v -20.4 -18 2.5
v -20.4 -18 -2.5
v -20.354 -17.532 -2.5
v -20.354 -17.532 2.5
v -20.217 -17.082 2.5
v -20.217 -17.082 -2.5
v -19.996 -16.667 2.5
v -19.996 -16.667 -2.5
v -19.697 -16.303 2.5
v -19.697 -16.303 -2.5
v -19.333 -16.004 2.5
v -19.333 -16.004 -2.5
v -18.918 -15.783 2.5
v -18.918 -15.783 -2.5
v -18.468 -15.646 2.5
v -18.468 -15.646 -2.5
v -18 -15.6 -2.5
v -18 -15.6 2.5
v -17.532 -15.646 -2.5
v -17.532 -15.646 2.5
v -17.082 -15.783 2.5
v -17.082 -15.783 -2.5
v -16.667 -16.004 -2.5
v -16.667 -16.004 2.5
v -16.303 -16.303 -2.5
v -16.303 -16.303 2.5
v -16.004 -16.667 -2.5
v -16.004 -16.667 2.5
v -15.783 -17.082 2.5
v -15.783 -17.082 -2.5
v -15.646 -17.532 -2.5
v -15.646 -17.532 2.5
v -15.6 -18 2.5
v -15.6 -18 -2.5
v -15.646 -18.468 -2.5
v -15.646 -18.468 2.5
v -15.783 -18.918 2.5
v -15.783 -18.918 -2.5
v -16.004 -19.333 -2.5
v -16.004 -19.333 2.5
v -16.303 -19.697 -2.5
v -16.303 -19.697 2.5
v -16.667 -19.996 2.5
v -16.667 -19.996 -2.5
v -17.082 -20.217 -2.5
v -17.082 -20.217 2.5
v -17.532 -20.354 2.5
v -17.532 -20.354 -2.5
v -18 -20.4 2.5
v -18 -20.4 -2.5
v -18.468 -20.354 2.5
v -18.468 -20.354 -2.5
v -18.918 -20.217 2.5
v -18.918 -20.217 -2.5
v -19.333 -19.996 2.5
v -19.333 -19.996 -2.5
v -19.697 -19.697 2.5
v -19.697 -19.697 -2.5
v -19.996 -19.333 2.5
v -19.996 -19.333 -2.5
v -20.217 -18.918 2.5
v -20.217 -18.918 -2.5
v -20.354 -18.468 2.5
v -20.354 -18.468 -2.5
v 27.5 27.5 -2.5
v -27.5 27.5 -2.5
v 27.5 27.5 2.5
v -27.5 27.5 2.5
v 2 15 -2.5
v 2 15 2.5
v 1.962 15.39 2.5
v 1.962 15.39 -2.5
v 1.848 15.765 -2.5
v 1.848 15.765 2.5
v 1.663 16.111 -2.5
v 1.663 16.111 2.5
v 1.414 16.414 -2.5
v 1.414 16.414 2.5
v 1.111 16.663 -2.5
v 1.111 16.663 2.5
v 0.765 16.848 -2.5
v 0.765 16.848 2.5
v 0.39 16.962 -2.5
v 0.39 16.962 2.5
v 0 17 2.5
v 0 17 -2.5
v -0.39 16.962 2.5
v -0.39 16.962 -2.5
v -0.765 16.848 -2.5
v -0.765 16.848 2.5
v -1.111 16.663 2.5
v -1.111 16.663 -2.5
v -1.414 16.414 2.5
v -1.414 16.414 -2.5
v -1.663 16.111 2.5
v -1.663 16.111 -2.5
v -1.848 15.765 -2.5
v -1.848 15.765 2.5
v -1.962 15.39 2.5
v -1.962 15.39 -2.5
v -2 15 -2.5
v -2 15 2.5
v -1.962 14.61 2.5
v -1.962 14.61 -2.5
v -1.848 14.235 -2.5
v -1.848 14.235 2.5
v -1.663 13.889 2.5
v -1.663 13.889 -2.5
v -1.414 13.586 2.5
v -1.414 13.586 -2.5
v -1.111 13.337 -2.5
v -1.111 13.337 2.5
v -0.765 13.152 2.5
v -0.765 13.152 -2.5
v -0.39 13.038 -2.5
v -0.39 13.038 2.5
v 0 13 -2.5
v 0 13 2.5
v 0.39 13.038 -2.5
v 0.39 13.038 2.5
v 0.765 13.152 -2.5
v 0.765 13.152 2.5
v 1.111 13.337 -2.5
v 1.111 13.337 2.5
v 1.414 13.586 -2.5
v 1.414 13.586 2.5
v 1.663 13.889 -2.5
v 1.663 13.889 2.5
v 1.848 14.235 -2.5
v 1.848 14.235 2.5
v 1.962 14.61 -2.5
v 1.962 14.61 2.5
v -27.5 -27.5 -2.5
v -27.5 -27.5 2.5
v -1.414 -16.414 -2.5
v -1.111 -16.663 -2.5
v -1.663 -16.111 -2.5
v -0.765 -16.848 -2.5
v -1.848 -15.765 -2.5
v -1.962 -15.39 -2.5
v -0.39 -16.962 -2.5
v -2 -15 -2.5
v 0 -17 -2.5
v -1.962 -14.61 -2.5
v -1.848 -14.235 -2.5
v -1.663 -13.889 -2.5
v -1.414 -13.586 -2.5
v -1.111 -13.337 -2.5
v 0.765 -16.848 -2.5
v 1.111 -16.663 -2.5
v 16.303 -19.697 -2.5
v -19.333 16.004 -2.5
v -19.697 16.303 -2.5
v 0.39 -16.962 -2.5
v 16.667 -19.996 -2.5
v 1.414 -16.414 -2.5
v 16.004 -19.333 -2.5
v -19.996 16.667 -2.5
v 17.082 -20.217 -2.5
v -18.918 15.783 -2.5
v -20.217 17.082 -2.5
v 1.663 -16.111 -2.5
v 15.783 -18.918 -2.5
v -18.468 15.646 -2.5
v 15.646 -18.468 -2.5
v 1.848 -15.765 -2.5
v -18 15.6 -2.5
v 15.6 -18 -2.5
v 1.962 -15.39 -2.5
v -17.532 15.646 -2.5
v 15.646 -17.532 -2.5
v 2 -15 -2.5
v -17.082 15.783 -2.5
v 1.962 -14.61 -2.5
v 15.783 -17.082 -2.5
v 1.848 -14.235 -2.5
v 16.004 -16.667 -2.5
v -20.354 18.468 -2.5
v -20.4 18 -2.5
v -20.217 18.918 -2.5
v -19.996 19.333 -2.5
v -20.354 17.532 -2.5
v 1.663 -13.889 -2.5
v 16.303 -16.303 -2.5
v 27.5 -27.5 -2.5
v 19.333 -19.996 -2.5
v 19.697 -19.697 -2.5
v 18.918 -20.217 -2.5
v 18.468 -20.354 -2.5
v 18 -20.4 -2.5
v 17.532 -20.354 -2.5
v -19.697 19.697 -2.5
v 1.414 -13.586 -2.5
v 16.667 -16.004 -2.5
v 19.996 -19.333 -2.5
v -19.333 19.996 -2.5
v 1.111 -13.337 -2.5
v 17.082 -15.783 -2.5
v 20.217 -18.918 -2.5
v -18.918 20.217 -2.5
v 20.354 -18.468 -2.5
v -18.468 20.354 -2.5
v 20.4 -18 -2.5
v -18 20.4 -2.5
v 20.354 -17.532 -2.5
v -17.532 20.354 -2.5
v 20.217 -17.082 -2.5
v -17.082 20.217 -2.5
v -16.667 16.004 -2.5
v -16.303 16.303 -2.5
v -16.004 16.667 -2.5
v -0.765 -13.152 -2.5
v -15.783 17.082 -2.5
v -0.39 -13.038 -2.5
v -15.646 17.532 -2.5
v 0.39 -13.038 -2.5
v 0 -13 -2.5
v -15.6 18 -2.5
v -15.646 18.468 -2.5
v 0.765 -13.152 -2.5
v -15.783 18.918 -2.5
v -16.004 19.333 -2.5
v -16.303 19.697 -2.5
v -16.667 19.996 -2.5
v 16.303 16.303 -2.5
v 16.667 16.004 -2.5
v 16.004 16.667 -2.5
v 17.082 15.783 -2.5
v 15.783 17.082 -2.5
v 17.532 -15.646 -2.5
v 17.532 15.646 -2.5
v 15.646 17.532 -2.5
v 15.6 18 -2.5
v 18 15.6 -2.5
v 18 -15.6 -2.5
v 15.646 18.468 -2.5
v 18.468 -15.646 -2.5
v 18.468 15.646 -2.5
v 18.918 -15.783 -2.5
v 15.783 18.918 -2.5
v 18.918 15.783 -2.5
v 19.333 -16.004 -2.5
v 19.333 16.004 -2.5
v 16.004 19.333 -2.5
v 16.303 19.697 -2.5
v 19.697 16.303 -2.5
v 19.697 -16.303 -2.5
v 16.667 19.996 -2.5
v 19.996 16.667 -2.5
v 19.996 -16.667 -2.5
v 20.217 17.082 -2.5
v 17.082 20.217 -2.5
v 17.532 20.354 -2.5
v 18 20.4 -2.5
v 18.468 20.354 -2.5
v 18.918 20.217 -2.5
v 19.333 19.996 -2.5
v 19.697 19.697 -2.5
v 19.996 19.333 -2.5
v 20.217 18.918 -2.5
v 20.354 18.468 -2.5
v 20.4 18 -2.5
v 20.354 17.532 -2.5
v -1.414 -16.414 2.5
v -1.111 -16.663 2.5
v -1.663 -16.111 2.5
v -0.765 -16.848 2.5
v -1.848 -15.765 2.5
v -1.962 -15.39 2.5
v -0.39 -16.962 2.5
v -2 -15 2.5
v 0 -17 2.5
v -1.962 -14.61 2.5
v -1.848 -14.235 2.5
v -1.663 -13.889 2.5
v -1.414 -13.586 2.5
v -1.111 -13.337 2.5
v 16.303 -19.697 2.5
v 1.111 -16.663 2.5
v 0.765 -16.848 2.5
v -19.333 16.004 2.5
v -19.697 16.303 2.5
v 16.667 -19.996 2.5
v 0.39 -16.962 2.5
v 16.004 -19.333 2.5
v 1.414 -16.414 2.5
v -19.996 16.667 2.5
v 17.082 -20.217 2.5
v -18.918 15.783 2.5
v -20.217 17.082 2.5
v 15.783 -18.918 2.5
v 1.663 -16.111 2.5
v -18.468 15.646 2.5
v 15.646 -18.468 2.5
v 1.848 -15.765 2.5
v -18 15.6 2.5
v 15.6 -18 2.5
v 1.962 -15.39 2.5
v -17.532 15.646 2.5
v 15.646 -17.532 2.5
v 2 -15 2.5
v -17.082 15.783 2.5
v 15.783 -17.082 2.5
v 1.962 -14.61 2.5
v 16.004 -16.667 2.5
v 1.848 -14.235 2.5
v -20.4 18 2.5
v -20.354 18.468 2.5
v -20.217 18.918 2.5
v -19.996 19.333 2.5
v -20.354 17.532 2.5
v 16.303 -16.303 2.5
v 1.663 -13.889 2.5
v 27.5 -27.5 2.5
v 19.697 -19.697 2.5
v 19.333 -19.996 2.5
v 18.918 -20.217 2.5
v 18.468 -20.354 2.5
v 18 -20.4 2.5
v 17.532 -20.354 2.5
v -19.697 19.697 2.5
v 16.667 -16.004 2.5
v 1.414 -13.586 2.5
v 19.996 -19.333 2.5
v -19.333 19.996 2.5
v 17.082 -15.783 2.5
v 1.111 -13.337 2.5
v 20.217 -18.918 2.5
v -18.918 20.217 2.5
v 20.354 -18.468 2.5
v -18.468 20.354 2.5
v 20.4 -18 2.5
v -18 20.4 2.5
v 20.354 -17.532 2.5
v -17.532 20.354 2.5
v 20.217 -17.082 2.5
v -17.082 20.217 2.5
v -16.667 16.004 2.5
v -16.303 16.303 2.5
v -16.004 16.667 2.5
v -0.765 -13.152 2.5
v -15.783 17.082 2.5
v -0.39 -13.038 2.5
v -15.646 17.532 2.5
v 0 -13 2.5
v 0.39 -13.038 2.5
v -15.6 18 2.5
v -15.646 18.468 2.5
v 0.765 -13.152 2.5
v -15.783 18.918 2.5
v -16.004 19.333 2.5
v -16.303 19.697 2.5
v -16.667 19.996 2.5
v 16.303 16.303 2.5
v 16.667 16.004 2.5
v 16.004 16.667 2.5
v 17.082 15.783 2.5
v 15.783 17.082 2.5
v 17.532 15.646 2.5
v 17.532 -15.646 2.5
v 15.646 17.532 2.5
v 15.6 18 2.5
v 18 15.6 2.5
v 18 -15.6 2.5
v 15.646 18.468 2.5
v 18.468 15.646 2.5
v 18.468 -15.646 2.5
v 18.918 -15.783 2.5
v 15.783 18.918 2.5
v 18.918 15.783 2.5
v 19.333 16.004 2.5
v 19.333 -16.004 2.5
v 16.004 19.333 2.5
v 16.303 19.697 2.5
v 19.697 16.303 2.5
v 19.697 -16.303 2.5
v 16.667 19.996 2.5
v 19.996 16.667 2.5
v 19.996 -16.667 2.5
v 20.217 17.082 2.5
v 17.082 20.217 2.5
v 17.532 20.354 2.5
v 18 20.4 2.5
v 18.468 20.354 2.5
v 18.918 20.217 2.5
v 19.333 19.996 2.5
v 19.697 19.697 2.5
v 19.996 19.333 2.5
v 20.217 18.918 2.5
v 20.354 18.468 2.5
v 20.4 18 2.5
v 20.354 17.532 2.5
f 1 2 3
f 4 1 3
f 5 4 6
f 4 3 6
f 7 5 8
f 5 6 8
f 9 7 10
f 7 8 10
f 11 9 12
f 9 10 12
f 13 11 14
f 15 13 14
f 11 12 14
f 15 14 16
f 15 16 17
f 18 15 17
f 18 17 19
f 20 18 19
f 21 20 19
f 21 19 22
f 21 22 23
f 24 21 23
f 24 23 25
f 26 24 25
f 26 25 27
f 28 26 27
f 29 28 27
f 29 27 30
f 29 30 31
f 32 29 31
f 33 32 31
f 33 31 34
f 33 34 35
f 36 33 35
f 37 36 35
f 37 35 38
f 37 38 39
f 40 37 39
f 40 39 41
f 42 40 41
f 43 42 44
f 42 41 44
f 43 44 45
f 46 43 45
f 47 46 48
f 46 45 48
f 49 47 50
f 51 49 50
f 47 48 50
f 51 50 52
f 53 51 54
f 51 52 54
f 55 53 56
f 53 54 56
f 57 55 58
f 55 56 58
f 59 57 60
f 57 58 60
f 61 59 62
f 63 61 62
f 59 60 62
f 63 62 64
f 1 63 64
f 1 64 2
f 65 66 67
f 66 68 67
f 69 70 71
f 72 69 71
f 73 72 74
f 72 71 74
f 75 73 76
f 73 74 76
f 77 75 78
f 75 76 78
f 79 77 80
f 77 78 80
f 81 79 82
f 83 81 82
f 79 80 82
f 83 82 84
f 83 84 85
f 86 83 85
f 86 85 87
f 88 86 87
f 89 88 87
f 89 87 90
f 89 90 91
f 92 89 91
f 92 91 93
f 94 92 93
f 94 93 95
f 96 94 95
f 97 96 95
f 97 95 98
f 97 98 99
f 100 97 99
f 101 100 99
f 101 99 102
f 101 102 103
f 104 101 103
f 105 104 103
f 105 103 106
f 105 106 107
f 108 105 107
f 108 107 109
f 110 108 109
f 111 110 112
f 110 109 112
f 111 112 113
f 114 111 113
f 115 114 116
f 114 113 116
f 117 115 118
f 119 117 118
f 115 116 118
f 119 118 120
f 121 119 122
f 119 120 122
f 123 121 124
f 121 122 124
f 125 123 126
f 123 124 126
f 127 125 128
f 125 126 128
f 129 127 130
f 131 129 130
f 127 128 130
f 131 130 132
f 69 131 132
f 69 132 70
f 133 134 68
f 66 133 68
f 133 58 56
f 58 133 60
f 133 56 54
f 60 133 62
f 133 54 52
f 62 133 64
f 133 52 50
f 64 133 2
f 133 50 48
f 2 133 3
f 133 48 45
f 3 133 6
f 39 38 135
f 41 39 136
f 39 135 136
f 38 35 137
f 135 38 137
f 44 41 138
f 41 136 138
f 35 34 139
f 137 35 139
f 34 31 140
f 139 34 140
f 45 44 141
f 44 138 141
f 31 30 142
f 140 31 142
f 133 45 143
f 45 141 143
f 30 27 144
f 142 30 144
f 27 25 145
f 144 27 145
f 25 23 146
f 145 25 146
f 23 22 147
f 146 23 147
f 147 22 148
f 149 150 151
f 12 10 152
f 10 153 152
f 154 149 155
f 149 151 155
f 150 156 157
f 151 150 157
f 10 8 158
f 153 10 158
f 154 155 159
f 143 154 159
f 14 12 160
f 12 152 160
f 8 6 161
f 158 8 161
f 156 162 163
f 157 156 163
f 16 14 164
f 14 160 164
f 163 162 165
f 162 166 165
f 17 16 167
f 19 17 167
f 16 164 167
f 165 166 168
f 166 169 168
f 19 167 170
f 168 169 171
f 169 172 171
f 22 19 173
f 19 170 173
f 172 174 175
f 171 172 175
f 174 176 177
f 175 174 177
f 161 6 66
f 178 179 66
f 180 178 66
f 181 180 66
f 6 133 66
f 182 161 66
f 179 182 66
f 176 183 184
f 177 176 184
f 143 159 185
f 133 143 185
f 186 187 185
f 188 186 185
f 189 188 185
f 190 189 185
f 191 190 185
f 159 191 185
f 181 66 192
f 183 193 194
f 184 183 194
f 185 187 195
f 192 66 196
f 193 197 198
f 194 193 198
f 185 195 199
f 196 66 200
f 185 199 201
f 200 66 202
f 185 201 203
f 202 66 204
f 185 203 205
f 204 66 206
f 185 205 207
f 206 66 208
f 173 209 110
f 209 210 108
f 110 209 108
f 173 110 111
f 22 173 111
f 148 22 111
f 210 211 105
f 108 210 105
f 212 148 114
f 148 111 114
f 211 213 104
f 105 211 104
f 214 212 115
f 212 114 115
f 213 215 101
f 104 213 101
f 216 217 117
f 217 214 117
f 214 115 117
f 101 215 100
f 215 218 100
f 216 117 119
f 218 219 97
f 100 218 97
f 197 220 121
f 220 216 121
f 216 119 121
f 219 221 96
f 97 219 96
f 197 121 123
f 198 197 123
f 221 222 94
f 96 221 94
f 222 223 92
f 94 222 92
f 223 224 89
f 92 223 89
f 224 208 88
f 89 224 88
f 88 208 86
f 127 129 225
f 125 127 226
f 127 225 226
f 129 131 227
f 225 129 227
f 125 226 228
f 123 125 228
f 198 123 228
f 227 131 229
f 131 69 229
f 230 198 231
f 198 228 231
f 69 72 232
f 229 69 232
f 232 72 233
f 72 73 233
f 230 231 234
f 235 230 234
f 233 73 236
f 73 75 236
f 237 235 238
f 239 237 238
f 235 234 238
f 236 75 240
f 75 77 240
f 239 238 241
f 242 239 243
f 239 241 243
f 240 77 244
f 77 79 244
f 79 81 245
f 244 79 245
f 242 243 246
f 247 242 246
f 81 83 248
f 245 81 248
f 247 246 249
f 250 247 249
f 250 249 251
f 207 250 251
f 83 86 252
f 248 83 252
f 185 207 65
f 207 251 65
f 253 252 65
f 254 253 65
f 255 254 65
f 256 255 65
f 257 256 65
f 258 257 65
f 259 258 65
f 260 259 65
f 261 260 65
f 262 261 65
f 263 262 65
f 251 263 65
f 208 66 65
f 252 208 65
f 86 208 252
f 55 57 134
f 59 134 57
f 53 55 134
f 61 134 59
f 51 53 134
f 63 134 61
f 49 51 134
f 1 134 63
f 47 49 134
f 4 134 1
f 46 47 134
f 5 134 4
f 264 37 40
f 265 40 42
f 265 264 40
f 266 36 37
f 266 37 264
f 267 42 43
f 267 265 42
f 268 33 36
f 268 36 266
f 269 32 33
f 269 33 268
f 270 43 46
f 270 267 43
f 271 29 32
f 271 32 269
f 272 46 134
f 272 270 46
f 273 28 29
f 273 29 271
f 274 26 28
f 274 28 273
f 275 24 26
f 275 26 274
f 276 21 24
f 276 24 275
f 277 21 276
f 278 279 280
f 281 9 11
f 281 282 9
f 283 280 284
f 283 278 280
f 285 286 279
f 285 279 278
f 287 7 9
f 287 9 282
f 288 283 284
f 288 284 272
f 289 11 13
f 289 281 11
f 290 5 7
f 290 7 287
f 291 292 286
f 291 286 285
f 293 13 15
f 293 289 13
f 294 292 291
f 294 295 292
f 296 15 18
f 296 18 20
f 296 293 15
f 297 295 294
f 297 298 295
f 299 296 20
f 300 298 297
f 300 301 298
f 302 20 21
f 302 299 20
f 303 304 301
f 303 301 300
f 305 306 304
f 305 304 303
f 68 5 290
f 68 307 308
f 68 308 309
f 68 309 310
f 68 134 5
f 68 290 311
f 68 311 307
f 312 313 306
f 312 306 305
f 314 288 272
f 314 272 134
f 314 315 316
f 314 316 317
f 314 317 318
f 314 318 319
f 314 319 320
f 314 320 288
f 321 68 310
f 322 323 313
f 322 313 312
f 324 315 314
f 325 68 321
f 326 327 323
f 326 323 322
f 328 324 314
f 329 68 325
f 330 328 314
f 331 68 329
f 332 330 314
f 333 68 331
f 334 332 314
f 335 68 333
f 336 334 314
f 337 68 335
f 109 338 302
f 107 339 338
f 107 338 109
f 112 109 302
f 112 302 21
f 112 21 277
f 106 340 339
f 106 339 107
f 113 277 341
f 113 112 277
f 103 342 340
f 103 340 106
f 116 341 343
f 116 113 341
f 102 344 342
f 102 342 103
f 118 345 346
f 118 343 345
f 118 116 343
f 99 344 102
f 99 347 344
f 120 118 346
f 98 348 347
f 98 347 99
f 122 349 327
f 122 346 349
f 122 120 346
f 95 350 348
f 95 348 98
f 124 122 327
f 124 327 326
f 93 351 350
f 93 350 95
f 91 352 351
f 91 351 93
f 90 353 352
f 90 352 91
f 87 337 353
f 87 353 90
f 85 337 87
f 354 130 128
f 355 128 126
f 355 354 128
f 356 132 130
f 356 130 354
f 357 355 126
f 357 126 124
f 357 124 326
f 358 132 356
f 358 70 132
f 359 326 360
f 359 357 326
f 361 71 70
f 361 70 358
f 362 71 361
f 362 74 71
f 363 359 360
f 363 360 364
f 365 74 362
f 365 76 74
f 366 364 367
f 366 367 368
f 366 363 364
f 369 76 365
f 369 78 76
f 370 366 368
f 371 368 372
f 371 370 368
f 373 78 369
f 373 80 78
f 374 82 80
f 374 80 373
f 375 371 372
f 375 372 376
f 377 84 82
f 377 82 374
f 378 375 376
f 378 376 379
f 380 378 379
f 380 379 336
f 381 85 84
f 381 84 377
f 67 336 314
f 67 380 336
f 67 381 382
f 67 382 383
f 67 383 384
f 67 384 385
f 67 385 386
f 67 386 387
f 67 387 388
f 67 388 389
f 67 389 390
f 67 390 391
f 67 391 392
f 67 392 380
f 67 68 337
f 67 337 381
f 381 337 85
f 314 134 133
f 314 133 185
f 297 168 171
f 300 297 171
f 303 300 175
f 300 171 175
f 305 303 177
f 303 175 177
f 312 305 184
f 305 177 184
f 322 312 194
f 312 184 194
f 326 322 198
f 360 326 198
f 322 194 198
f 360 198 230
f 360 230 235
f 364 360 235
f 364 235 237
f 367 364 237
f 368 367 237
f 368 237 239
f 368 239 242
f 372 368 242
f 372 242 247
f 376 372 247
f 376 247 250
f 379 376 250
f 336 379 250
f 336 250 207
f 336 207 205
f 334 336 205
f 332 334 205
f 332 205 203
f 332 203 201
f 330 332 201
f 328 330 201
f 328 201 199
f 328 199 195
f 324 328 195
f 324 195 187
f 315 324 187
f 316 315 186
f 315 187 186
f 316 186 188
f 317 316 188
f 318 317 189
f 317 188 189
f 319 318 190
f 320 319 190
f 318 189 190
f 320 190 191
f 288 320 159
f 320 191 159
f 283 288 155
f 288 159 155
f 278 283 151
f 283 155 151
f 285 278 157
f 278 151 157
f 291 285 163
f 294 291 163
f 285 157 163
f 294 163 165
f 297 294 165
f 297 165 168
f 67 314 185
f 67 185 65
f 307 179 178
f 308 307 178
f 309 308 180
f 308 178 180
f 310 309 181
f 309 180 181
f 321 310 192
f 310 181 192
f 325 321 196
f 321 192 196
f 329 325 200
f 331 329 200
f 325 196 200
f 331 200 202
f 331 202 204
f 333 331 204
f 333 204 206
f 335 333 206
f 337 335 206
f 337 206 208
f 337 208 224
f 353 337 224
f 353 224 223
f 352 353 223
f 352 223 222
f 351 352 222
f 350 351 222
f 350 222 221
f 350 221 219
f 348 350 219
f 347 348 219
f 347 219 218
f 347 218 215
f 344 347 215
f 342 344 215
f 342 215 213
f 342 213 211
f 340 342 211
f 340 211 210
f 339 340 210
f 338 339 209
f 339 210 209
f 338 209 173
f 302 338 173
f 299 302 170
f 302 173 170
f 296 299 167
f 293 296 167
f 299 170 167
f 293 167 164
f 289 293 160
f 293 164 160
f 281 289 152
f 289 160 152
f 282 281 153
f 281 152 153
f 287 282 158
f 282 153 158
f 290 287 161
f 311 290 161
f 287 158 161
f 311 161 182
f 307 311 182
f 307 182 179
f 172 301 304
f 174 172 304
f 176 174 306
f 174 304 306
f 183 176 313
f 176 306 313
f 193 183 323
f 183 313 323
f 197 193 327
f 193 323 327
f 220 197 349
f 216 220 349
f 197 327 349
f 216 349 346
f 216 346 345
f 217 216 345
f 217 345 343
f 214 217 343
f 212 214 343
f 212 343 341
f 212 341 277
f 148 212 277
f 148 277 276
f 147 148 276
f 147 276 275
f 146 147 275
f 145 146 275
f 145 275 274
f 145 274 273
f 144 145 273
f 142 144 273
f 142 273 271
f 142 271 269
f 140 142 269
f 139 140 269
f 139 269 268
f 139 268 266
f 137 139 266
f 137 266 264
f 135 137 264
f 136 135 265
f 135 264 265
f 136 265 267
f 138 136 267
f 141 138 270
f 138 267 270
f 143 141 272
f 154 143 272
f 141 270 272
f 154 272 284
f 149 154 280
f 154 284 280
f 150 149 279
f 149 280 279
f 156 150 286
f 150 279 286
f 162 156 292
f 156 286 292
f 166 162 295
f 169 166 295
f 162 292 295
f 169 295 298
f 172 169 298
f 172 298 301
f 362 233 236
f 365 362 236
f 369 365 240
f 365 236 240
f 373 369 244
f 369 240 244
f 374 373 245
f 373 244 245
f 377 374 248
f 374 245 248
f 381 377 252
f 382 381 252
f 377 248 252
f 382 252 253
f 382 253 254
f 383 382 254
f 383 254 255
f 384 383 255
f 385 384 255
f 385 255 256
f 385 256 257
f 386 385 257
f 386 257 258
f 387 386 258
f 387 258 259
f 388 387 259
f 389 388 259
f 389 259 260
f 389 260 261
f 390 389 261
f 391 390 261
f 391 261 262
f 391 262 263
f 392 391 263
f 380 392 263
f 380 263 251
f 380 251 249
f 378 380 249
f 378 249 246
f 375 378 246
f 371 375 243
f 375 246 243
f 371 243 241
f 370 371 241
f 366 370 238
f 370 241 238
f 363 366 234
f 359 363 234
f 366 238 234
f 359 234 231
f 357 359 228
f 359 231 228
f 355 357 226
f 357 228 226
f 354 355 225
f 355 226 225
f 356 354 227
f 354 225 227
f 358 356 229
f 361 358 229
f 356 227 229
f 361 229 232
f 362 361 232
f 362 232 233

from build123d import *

# Parameters (mm, degrees)
SKETCH1_W                  = 55
SKETCH1_H                  = 55
BOSS_EXTRUDE1_DEPTH        = 2.5
F_4_8_4_8_DIAMETER_HOLE1_D = 4.8
LPATTERN1_COUNT            = 2
LPATTERN1_PITCH            = 36
LPATTERN1_COUNT_DIR2       = 2
LPATTERN1_PITCH_DIR2       = 36
SKETCH4_R                  = 2
CUT_EXTRUDE1_DEPTH         = 40.210967853


with BuildPart() as part:
    # Sketch1 → Boss-Extrude1 (new, symmetric)
    with BuildSketch(Plane.XY):
        Rectangle(SKETCH1_W, SKETCH1_H)
    extrude(amount=BOSS_EXTRUDE1_DEPTH, both=True)

    # Ø4.8 (4.8) Diameter Hole1 (through all)
    with Locations(Plane.XY.offset(2.5)):
        with Locations((18, 18)):
            f_4_8_4_8_diameter_hole1 = Hole(F_4_8_4_8_DIAMETER_HOLE1_D / 2)

    # LPattern1: 4.8 _4.8_ Diameter Hole1 2 × 2
    with Locations(*[(-i * LPATTERN1_PITCH, -j * LPATTERN1_PITCH_DIR2, 0) for i in range(LPATTERN1_COUNT) for j in range(LPATTERN1_COUNT_DIR2) if (i, j) != (0, 0)]):
        add(f_4_8_4_8_diameter_hole1, mode=Mode.SUBTRACT)

    # Sketch4 → Cut-Extrude1 (cut, through all)
    with BuildSketch(Plane.XY.offset(2.5)):
        with Locations((0, 15)):
            Circle(SKETCH4_R)
        with Locations((0, -15)):
            Circle(SKETCH4_R)
    extrude(amount=-CUT_EXTRUDE1_DEPTH, mode=Mode.SUBTRACT)


solid = part.part
